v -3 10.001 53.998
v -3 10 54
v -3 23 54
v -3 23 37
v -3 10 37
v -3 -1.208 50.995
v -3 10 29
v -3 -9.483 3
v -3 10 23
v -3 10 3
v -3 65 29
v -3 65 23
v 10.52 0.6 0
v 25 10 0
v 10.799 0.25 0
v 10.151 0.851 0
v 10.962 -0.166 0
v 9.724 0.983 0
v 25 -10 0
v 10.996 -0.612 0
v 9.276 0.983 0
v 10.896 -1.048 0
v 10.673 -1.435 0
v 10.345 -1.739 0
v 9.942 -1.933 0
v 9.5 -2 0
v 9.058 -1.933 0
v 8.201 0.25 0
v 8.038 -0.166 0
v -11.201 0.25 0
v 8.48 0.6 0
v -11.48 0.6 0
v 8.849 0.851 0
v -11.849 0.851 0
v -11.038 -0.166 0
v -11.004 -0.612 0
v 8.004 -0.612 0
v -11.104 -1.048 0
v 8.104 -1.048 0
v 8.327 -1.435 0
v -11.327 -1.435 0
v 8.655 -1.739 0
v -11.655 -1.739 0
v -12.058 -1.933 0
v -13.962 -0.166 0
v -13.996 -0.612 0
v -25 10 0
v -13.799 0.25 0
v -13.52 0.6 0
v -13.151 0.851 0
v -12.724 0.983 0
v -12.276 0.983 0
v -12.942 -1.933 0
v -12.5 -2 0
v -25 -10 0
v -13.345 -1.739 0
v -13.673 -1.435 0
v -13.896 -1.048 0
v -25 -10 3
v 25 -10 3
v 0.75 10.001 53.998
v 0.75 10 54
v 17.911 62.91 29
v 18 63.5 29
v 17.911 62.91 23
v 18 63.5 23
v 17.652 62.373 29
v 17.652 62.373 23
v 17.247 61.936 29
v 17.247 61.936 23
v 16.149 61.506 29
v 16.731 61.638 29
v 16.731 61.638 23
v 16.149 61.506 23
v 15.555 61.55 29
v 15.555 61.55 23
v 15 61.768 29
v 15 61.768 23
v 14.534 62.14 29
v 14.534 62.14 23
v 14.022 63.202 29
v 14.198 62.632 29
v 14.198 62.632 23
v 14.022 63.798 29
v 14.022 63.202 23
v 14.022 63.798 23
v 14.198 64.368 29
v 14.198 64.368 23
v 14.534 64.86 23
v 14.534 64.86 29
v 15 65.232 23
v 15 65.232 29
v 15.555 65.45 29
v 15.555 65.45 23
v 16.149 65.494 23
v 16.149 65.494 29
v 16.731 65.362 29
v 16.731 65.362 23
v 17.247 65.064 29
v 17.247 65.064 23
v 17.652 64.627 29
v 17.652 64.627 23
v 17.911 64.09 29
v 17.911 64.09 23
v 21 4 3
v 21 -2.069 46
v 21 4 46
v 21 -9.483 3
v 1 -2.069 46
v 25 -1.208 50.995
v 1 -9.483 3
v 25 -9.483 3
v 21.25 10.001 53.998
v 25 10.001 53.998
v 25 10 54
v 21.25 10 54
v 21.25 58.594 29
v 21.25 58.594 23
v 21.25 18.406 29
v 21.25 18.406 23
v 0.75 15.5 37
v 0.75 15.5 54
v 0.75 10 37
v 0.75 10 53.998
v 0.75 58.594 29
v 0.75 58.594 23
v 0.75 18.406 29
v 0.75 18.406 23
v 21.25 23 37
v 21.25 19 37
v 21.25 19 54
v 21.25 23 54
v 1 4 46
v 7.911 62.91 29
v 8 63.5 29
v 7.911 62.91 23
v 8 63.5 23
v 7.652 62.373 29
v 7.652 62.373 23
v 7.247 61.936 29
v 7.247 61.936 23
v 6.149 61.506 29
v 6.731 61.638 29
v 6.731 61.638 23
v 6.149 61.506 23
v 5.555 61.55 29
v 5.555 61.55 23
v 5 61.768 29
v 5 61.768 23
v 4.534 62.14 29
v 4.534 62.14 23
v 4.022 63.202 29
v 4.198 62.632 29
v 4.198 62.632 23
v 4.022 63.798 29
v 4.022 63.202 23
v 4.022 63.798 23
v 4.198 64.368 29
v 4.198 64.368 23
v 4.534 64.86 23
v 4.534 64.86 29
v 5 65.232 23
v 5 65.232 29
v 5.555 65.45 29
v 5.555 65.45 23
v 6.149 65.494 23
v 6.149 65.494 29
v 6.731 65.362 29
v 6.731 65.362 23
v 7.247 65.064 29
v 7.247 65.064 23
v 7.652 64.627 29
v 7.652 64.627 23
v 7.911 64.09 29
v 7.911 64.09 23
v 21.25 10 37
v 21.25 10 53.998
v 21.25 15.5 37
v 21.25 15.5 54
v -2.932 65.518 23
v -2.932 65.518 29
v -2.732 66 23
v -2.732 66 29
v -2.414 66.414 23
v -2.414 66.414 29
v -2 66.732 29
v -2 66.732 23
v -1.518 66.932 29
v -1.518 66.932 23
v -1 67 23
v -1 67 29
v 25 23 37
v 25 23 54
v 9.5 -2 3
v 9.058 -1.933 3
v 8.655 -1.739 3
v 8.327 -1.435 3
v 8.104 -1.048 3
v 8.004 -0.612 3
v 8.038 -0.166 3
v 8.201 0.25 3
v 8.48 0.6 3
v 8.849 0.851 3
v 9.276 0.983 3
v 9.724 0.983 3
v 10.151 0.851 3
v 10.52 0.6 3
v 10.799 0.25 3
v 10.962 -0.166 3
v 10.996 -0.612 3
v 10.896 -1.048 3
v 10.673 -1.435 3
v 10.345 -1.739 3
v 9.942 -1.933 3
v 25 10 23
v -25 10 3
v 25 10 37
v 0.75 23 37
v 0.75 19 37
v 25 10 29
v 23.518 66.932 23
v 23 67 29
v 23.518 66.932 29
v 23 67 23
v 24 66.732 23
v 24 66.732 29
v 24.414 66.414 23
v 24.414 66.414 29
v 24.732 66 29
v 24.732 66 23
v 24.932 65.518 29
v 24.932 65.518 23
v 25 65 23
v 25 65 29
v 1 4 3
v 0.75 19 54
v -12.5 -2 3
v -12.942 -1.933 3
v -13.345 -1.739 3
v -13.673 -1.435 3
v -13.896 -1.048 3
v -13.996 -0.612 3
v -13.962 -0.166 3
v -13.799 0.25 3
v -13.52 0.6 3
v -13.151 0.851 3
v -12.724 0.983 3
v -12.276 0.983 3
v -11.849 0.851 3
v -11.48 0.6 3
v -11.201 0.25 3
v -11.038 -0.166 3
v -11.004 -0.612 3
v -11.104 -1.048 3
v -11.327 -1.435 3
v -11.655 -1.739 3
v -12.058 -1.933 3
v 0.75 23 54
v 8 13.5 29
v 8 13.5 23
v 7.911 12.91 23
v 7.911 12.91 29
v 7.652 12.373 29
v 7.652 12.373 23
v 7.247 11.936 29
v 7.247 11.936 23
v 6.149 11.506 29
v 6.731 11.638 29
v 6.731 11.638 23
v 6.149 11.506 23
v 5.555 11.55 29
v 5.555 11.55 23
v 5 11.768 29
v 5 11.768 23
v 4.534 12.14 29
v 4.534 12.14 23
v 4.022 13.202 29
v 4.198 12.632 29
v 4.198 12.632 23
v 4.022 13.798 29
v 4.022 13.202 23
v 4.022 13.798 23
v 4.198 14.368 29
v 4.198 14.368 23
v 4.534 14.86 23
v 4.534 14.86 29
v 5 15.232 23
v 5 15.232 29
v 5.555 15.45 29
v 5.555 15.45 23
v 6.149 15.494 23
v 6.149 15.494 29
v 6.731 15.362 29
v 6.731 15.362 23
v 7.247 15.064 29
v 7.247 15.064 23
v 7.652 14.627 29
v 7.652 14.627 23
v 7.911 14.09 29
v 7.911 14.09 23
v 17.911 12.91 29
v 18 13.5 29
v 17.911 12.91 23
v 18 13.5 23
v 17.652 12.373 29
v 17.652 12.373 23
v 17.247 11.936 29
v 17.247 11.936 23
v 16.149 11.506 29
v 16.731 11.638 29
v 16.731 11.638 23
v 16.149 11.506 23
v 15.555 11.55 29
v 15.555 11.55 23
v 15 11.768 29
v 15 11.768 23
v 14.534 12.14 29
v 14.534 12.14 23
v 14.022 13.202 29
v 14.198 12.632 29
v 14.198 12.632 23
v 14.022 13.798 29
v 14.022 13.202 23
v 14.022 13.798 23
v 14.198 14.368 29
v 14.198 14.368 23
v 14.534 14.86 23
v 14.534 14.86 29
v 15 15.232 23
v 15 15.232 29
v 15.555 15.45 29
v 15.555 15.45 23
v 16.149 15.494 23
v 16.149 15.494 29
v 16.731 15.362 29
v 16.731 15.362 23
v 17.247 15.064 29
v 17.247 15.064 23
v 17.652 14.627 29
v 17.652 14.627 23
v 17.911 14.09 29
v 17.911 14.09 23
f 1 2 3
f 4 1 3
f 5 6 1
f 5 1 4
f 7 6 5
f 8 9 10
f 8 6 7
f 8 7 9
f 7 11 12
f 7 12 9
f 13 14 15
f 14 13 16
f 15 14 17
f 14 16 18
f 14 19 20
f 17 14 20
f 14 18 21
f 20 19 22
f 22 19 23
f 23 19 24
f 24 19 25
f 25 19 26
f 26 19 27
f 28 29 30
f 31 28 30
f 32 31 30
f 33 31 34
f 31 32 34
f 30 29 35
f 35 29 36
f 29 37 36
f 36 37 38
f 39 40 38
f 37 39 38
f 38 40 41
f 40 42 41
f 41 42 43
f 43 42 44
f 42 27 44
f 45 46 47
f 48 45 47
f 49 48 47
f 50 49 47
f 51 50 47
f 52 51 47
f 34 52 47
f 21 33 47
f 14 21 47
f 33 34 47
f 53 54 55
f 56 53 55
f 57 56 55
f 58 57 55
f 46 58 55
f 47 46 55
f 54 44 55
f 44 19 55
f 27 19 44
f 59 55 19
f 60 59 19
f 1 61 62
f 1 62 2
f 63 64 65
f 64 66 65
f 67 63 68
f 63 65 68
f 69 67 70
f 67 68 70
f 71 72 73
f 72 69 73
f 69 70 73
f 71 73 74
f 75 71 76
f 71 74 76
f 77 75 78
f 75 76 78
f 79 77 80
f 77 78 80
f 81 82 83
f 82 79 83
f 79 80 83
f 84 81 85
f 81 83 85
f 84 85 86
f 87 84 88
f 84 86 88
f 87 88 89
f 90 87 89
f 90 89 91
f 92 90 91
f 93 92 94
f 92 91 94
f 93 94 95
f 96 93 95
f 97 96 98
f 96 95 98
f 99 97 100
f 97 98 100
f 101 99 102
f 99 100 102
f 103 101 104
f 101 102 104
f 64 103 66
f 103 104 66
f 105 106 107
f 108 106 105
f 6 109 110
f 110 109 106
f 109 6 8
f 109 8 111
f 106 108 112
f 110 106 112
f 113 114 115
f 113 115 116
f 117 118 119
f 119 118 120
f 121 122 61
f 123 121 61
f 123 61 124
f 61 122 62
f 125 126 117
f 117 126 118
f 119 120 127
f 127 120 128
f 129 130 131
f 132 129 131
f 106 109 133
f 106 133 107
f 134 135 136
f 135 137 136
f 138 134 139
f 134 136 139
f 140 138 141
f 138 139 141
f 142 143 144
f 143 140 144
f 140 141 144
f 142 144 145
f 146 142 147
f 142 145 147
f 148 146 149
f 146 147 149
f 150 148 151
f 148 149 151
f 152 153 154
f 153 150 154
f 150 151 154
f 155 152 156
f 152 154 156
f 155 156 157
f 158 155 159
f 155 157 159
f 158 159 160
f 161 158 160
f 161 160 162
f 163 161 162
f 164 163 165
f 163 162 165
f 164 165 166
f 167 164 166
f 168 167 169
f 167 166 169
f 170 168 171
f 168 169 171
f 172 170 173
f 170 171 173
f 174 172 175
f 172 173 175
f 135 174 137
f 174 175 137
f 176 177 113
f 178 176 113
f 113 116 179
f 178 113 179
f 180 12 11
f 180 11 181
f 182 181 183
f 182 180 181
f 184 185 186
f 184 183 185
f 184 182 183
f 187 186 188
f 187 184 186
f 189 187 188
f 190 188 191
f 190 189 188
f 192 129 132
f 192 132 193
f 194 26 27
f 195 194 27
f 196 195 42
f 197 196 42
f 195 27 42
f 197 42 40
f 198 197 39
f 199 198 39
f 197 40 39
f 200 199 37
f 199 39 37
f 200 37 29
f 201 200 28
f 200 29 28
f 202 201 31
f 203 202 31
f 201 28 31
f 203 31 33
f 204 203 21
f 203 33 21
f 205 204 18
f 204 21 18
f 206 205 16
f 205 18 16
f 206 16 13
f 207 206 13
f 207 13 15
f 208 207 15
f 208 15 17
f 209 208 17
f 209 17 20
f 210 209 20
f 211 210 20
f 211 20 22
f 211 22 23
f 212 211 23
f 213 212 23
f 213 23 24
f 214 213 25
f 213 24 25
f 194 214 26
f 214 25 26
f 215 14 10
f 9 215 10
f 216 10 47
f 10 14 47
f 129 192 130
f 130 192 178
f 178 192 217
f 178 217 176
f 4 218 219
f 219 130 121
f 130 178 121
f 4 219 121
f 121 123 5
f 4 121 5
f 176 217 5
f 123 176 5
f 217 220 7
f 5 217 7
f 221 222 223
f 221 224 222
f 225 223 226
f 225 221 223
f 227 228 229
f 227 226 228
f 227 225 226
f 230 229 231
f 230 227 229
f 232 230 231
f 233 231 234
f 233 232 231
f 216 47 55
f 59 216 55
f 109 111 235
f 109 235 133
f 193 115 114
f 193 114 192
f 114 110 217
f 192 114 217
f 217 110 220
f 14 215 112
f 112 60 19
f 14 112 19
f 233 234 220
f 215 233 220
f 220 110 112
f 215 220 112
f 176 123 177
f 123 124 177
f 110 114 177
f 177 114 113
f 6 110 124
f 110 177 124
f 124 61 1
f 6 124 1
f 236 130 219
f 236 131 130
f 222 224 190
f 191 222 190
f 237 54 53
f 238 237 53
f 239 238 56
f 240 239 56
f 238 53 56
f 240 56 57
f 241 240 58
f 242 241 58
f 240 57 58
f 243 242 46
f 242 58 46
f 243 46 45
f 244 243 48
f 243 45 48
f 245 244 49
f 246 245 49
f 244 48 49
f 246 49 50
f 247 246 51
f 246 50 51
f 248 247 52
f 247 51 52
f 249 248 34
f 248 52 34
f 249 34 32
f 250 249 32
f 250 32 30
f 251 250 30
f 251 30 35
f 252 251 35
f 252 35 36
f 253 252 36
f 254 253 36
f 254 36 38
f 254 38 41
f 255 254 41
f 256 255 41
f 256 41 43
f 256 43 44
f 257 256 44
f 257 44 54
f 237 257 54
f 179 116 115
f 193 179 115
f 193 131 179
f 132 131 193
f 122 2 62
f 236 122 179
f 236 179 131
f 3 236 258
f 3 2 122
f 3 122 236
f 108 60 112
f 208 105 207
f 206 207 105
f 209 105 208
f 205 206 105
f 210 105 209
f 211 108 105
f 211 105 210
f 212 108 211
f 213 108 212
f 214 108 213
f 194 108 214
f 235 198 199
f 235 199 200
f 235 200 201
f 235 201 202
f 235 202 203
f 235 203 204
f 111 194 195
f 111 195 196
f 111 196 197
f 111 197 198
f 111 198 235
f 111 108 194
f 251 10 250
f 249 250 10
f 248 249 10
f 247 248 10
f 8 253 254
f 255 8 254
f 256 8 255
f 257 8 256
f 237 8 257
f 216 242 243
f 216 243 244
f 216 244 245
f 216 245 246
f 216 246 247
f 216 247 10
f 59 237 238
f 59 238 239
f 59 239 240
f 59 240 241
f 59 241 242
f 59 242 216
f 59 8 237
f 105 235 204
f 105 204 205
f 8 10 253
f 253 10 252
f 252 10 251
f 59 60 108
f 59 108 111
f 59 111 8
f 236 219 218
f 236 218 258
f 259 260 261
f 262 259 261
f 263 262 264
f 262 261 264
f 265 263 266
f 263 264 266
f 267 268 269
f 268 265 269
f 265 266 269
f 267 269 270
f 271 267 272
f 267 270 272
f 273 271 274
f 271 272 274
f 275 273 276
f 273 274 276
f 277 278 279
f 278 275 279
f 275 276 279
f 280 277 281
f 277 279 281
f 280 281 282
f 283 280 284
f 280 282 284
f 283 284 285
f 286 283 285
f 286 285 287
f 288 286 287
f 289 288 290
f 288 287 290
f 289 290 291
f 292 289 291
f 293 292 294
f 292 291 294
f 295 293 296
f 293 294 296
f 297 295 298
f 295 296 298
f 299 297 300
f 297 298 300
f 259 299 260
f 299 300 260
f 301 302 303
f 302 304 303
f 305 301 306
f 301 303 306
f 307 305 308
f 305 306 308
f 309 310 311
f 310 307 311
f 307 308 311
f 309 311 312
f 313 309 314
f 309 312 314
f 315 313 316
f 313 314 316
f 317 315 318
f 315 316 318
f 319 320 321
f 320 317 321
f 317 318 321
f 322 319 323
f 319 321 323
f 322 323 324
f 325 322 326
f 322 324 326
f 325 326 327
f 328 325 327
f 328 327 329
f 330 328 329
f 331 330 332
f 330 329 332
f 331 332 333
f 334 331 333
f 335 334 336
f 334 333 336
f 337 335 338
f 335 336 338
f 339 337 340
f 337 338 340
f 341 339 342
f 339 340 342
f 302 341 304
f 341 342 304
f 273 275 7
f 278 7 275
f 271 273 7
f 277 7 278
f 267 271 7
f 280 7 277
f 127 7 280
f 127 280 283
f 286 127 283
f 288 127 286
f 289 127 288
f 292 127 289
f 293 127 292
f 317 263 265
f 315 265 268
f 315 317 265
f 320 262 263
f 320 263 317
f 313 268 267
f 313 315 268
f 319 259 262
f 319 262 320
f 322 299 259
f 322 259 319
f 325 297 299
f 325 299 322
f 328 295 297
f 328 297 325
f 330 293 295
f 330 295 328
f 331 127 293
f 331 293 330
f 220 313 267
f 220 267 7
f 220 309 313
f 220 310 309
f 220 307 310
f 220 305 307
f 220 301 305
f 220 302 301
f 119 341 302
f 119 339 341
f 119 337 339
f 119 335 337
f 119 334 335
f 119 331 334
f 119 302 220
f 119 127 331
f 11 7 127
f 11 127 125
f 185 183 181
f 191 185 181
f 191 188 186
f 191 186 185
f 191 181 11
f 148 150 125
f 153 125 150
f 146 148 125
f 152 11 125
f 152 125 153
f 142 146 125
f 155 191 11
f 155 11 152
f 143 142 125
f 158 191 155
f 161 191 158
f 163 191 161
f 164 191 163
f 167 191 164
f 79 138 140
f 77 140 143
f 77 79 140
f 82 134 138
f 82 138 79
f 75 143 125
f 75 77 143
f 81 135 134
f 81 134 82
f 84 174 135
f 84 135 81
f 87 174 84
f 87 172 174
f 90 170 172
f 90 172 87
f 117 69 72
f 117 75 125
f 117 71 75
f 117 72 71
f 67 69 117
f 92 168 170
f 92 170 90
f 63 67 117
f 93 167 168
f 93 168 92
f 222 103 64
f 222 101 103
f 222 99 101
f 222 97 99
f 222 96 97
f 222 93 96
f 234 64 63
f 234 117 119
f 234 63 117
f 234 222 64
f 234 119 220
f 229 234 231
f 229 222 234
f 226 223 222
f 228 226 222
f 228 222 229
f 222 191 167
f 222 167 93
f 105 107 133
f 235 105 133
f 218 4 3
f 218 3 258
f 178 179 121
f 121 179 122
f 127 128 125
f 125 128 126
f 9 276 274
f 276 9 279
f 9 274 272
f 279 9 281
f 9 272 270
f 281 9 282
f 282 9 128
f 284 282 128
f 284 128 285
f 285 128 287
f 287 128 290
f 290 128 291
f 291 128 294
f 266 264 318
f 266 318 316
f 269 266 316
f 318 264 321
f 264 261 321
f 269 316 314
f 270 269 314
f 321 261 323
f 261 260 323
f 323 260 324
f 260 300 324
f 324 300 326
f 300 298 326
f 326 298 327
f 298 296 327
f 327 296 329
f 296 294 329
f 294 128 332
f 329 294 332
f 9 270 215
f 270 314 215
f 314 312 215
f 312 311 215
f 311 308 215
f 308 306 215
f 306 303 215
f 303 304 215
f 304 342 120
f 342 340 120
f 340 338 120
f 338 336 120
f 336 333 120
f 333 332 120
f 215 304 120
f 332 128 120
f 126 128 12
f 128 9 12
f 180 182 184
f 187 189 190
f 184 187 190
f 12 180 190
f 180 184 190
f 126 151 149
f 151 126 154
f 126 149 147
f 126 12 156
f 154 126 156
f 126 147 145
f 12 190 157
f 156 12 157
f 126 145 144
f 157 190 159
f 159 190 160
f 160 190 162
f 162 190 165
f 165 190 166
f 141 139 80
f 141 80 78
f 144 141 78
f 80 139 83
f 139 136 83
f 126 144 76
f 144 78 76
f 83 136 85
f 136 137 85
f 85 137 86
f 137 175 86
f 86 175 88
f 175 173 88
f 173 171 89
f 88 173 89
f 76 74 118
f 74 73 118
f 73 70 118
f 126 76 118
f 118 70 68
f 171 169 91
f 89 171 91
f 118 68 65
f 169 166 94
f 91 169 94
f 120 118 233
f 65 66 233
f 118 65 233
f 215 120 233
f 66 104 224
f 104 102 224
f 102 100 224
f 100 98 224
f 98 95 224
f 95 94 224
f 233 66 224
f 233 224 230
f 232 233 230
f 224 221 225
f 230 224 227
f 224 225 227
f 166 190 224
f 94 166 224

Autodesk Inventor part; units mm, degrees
ref_plane "Plano de trabajo1" through (0, 0, 23) normal (0, 0, 1) x (1, 0, 0)
sketch "Boceto2" plane through (0, 0, 23) normal (0, 0, 1) x (1, 0, 0)
  line L0 (-3, 10) -> (25, 10)
  line L1 (25, 10) -> (25, 65)
  line L2 (23, 67) -> (-1, 67)
  line L3 (-3, 65) -> (-3, 10)
  line L4 (-3, 10) -> (25, 67) construction
  line L5 (25, 10) -> (-3, 67) construction
  line L6 (21.25, 18.406) -> (0.75, 18.406)
  line L7 (0.75, 18.406) -> (0.75, 58.594)
  line L8 (0.75, 58.594) -> (21.25, 58.594)
  line L9 (21.25, 58.594) -> (21.25, 18.406)
  line L10 (21.25, 18.406) -> (0.75, 58.594) construction
  line L11 (0.75, 18.406) -> (21.25, 58.594) construction
  circle A0 centre (6, 63.5) radius 2
  circle A1 centre (16, 63.5) radius 2
  circle A2 centre (6, 13.5) radius 2
  circle A3 centre (16, 13.5) radius 2
  line L12 (25, -6.6) -> (-3, -6.6)
  line L13 (-3, -6.6) -> (-3, 10)
  line L14 (-3, 10) -> (25, 10)
  line L15 (25, 10) -> (25, -6.6)
  line L16 (25, -6.6) -> (-3, 10) construction
  line L17 (-3, -6.6) -> (25, 10) construction
  arc A4 (-1, 67) -> (-3, 65) centre (-1, 65) ccw
  arc A5 (25, 65) -> (23, 67) centre (23, 65) ccw
  point P0 (0, 0)
  point P1 (11, 38.5)
  point P2 (11, 1.7)
  dimension "d5" = 28
  dimension "d6" = 57
  dimension "d9" = 67
  dimension "d10" = 10
  dimension "d12" = 25
  dimension "d13" = 20.5
  dimension "d14" = 40.188
  dimension "d15" = 4
  dimension "d16" = 4
  dimension "d17" = 4
  dimension "d18" = 4
  dimension "d21" = 10
  dimension "d22" = 10
  dimension "d23" = 7
  dimension "d26" = 3.5
  dimension "d27" = 3.5
  dimension "d28" = 3.5
  dimension "d29" = 3.5
  dimension "d38" = 28
  dimension "d39" = 16.6
  dimension "d40" = 25
  dimension "d41" = 10
  dimension "d82" = 2
  dimension "d84" = 7
  dimension "d85" = 9
ref_plane "Plano de trabajo2" through (0, 0, 58) normal (0, 0, 1) x (1, 0, 0)
sketch "Boceto3" plane through (0, 0, 58) normal (0, 0, 1) x (1, 0, 0)
  line L0 (25, 0) -> (-3, 0)
  line L1 (-3, 0) -> (-3, 10)
  line L2 (-3, 10) -> (25, 10)
  line L3 (25, 10) -> (25, 0)
  line L4 (25, 0) -> (-3, 10) construction
  line L5 (-3, 0) -> (25, 10) construction
  point P0 (0, 0)
  point P1 (11, 5)
  dimension "d31" = 28
  dimension "d32" = 10
  dimension "d35" = 10
  dimension "d36" = 25
ref_plane "Plano de trabajo3" through (25, 10, 0) normal (0, 0, 1) x (-1, 0, 0)
sketch "Boceto4" plane through (25, 10, 0) normal (0, 0, 1) x (-1, 0, 0)
  line L0 (0, 0) -> (50, 0)
  line L1 (50, 0) -> (50, 20)
  line L2 (50, 20) -> (0, 20)
  line L3 (0, 20) -> (0, 0)
  line L4 (0, 0) -> (50, 20) construction
  line L5 (50, 0) -> (0, 20) construction
  line L6 (0, 20) -> (0, 0)
  line L7 (28, 0) -> (28, 20)
  point P0 (0, 0)
  dimension "d42" = 50
  dimension "d43" = 20
  dimension "d44" = 50
  dimension "d46" = 28
ref_plane "Plano de trabajo4" through (25, 10, 0) normal (0, 0, 1) x (-1, 0, 0)
sketch "Boceto5" plane through (25, 10, 0) normal (0, 0, 1) x (-1, 0, 0)
  line L0 (28, 0) -> (28, 20)
  line L1 (28, 20) -> (0, 20)
  line L2 (0, 20) -> (0, 0)
  line L3 (0, 0) -> (28, 0)
  point P0 (25, 10)
  dimension "d48" = 20
  dimension "d49" = 28
  dimension "d50" = 20
  dimension "d51" = 28
  dimension "d52" = 25
  dimension "d53" = 10
extrude "Extrusión1" add sketch "Boceto4" along normal blind 3
extrude "Extrusión2" add sketch "Boceto2" along normal blind 6 contours L3 A4 L2 A5 L1 L0
ref_plane "Plano de trabajo5" through (0, 10, 0) normal (0, 1, 0) x (-1, 0, 0)
ref_plane "Plano de trabajo7" through (0, -10, 0) normal (0, 1, 0) x (-1, 0, 0)
loft "Solevación2" add profiles "Boceto3", "Boceto5"
sketch "Boceto9" plane through (0, 10, 0) normal (0, 1, 0) x (-1, 0, 0)
  line L0 (-21.25, 58) -> (-0.75, 58)
  line L1 (-0.75, 58) -> (-0.75, 29)
  line L2 (-0.75, 29) -> (-21.25, 29)
  line L3 (-21.25, 29) -> (-21.25, 58)
  line L4 (-21.25, 58) -> (-0.75, 29) construction
  line L5 (-0.75, 58) -> (-21.25, 29) construction
  line L6 (-23, 29) -> (1, 29) projected
  line L7 (-25, 58) -> (-25, 29) projected
  point P0 (0, 0)
  point P1 (-11, 43.5)
  dimension "d91" = 20.5
  dimension "d92" = 29
  dimension "d93" = 29
  dimension "d94" = 3.75
extrude "Extrusión5" add sketch "Boceto9" along normal blind 9
sketch "Boceto10" plane through (0, -10, 0) normal (0, 1, 0) x (-1, 0, 0)
  line L0 (-1, 46) -> (-21, 46)
  line L1 (-21, 46) -> (-21, 3)
  line L2 (-21, 3) -> (-1, 3)
  line L3 (-1, 3) -> (-1, 46)
  line L4 (-1, 46) -> (-21, 3) construction
  line L5 (-21, 46) -> (-1, 3) construction
  line L6 (-25, 58) -> (3, 58) projected
  line L7 (-25, 58) -> (-25, 3) projected
  line L8 (3, 58) -> (3, 3) projected
  line L9 (25, 3) -> (-25, 3) projected
  point P0 (0, 0)
  point P1 (-11, 24.5)
  dimension "d97" = 20
  dimension "d98" = 43
  dimension "d99" = 12
  dimension "d100" = 4
  dimension "d101" = 4
  dimension "d102" = 0
extrude "Extrusión6" cut sketch "Boceto10" along normal blind 14 contours L3 L2 L1 L0
ref_plane "Plano de trabajo8" through (1, 0, 0) normal (1, 0, 0) x (0, 1, 0)
sketch "Boceto11" plane through (1, 0, 0) normal (1, 0, 0) x (0, 1, 0)
  line L0 (10, 29) -> (24, 29)
  line L1 (24, 29) -> (24, 37)
  line L2 (24, 37) -> (10, 37)
  line L3 (10, 37) -> (10, 29)
  line L4 (10, 29) -> (24, 37) construction
  line L5 (24, 29) -> (10, 37) construction
  line L6 (10, 58) -> (10, 29) projected
  line L7 (65, 29) -> (10, 29) projected
  point P0 (0, 0)
  point P1 (17, 33)
  dimension "d106" = 14
  dimension "d107" = 8
  dimension "d108" = 14
  dimension "d109" = 0
extrude "Extrusión7" cut sketch "Boceto11" along normal blind 24 and the other way blind 4
sketch "Boceto12" plane through (-3, 10, 58) normal (0, 1, 0) x (1, 0, 0)
  line L0 (0, 0) -> (0, 21)
  line L1 (3.75, 21) -> (3.75, 0)
  line L2 (3.75, 0) -> (0, 0)
  line L3 (0, 0) -> (0, 21)
  line L4 (35.9308, 19.3547) -> (28, 21)
  line L5 (34.2703, -7.1098) -> (39.6026, 18.5929)
  line L6 (35.9308, 19.3547) -> (39.6026, 18.5929)
  line L7 (39.6026, 18.5929) -> (34.2703, -7.1098)
  line L8 (34.2703, -7.1098) -> (30.5984, -6.348)
  line L9 (3.75, 21) -> (0, 21)
  line L10 (3.75, 21) -> (3.75, 0)
  line L11 (35.9308, 19.3547) -> (30.5984, -6.348)
  line L12 (34.2703, -7.1098) -> (30.5984, -6.348)
  line L13 (3.75, 0) -> (0, 0)
  line L14 (3.75, 21) -> (24.25, 21) projected
  point P0 (18.3993, 70.2266)
  point P1 (0, 21)
  dimension "d130" = 3.75
  dimension "d131" = 0
extrude "Extrusión9" add sketch "Boceto12" along normal blind 13 contours L0 L9 L1 L2
sketch "Boceto13" plane through (21.25, 10, 58) normal (0, 1, 0) x (1, 0, 0)
  line L0 (3.75, 0) -> (-24.25, 0) projected
  line L1 (3.75, 0) -> (0, 0)
  line L2 (3.75, 0) -> (-1, 0)
  line L3 (-20.5, 0) -> (0, 0) projected
  line L4 (-0.25, 12) -> (-0.25, 55) projected
  line L5 (3.75, 0) -> (3.75, 55) projected
  line L6 (3.75, 0) -> (-1, 0)
  line L7 (0, 0) -> (3.75, 0)
  line L8 (3.75, 0) -> (3.75, 21)
  line L9 (3.75, 21) -> (0, 21)
  line L10 (0, 21) -> (0, 0)
  line L11 (0, 0) -> (3.75, 21) construction
  line L12 (3.75, 0) -> (0, 21) construction
  point P0 (-21.25, 58)
  point P1 (3.75, 21)
  point P2 (0, 21)
  point P3 (1.875, 10.5)
  dimension "d125" = 3.75
  dimension "d126" = 21
  dimension "d127" = 0
  dimension "d128" = 0
extrude "Extrusión10" add sketch "Boceto13" along normal blind 13
ref_plane "Plano de trabajo9" through (-3, 0, 0) normal (1, 0, 0) x (0, 1, 0)
sketch "Boceto14" plane through (-3, 0, 0) normal (1, 0, 0) x (0, 1, 0)
  line L0 (-4, 54) -> (23, 54)
  line L1 (23, 54) -> (23, 58)
  line L2 (23, 58) -> (-4, 58)
  line L3 (-4, 58) -> (-4, 54)
  line L4 (0, 58) -> (23, 58) projected
  line L5 (23, 37) -> (23, 58) projected
  line L6 (10, 37) -> (23, 37) projected
  point P0 (0, 0)
  dimension "d133" = 0
  dimension "d134" = 4
  dimension "d135" = 0
  dimension "d136" = 27
  dimension "d139" = 17
extrude "Extrusión11" cut sketch "Boceto14" along normal blind 28
ref_plane "Plano de trabajo10" through (0, 0, 54) normal (0, 0, 1) x (1, 0, 0)
sketch "Boceto15" plane through (0, 0, 54) normal (0, 0, 1) x (1, 0, 0)
  line L0 (0.75, 10.0003) -> (21.25, 10.0003)
  line L1 (21.25, 10.0003) -> (21.25, 15.5)
  line L2 (21.25, 15.5) -> (0.75, 15.5)
  line L3 (0.75, 15.5) -> (0.75, 10.0003)
  line L4 (0.75, 18.406) -> (0.75, 58.594) projected
  line L5 (21.25, 58.594) -> (21.25, 18.406) projected
  line L6 (0.75, 19) -> (21.25, 19) projected
  line L7 (25, -0.6897) -> (-3, -0.6897) projected
  point P0 (0, 0)
  dimension "d141" = 0
  dimension "d142" = 0
  dimension "d143" = 3.5
  dimension "d144" = 10.69
extrude "Extrusión12" cut sketch "Boceto15" against normal blind 20
ref_plane "Plano de trabajo11" through (25, 10, 3) normal (0, 0, 1) x (-1, 0, 0)
sketch "Boceto17" plane through (25, 10, 3) normal (0, 0, 1) x (-1, 0, 0)
  circle A0 centre (37.5, 10.5) radius 1.5
  circle A1 centre (15.5, 10.5) radius 1.5
  line L0 (28, 0) -> (50, 0) projected
  line L1 (50, 0) -> (50, 20) projected
  point P0 (25, 10)
  dimension "d154" = 3
  dimension "d155" = 3
  dimension "d156" = 9
  dimension "d157" = 9
  dimension "d158" = 11
  dimension "d159" = 19
hole "Agujero1" at (-12.5, -0.5, 3) direction (0, 0, -1) diameter 3 end through all
hole "Agujero2" at (9.5, -0.5, 3) direction (0, 0, -1) diameter 3 end through all
ref_plane "Plano de trabajo12" through (9.125, 10.0003, 54) normal (0, 0.2588, -0.9659) x (-1, 0, 0)
sketch "Boceto18" plane through (9.125, 10.0003, 54) normal (0, 0.2588, -0.9659) x (-1, 0, 0)
  line L0 (-15.875, -6.4708) -> (-15.875, 46.6551) projected
  line L1 (16.6517, -12) -> (-15.875, -12)
  line L2 (-15.875, -12) -> (-15.875, 0)
  line L3 (-15.875, 0) -> (16.6517, 0)
  line L4 (16.6517, 0) -> (16.6517, -12)
  line L5 (-12.125, 0) -> (8.375, 0) projected
  point P0 (9.125, -23.6358)
  dimension "d177" = 12
  dimension "d178" = 0
extrude "Extrusión13" cut sketch "Boceto18" against normal blind 3.5
properties part number "Motor"
